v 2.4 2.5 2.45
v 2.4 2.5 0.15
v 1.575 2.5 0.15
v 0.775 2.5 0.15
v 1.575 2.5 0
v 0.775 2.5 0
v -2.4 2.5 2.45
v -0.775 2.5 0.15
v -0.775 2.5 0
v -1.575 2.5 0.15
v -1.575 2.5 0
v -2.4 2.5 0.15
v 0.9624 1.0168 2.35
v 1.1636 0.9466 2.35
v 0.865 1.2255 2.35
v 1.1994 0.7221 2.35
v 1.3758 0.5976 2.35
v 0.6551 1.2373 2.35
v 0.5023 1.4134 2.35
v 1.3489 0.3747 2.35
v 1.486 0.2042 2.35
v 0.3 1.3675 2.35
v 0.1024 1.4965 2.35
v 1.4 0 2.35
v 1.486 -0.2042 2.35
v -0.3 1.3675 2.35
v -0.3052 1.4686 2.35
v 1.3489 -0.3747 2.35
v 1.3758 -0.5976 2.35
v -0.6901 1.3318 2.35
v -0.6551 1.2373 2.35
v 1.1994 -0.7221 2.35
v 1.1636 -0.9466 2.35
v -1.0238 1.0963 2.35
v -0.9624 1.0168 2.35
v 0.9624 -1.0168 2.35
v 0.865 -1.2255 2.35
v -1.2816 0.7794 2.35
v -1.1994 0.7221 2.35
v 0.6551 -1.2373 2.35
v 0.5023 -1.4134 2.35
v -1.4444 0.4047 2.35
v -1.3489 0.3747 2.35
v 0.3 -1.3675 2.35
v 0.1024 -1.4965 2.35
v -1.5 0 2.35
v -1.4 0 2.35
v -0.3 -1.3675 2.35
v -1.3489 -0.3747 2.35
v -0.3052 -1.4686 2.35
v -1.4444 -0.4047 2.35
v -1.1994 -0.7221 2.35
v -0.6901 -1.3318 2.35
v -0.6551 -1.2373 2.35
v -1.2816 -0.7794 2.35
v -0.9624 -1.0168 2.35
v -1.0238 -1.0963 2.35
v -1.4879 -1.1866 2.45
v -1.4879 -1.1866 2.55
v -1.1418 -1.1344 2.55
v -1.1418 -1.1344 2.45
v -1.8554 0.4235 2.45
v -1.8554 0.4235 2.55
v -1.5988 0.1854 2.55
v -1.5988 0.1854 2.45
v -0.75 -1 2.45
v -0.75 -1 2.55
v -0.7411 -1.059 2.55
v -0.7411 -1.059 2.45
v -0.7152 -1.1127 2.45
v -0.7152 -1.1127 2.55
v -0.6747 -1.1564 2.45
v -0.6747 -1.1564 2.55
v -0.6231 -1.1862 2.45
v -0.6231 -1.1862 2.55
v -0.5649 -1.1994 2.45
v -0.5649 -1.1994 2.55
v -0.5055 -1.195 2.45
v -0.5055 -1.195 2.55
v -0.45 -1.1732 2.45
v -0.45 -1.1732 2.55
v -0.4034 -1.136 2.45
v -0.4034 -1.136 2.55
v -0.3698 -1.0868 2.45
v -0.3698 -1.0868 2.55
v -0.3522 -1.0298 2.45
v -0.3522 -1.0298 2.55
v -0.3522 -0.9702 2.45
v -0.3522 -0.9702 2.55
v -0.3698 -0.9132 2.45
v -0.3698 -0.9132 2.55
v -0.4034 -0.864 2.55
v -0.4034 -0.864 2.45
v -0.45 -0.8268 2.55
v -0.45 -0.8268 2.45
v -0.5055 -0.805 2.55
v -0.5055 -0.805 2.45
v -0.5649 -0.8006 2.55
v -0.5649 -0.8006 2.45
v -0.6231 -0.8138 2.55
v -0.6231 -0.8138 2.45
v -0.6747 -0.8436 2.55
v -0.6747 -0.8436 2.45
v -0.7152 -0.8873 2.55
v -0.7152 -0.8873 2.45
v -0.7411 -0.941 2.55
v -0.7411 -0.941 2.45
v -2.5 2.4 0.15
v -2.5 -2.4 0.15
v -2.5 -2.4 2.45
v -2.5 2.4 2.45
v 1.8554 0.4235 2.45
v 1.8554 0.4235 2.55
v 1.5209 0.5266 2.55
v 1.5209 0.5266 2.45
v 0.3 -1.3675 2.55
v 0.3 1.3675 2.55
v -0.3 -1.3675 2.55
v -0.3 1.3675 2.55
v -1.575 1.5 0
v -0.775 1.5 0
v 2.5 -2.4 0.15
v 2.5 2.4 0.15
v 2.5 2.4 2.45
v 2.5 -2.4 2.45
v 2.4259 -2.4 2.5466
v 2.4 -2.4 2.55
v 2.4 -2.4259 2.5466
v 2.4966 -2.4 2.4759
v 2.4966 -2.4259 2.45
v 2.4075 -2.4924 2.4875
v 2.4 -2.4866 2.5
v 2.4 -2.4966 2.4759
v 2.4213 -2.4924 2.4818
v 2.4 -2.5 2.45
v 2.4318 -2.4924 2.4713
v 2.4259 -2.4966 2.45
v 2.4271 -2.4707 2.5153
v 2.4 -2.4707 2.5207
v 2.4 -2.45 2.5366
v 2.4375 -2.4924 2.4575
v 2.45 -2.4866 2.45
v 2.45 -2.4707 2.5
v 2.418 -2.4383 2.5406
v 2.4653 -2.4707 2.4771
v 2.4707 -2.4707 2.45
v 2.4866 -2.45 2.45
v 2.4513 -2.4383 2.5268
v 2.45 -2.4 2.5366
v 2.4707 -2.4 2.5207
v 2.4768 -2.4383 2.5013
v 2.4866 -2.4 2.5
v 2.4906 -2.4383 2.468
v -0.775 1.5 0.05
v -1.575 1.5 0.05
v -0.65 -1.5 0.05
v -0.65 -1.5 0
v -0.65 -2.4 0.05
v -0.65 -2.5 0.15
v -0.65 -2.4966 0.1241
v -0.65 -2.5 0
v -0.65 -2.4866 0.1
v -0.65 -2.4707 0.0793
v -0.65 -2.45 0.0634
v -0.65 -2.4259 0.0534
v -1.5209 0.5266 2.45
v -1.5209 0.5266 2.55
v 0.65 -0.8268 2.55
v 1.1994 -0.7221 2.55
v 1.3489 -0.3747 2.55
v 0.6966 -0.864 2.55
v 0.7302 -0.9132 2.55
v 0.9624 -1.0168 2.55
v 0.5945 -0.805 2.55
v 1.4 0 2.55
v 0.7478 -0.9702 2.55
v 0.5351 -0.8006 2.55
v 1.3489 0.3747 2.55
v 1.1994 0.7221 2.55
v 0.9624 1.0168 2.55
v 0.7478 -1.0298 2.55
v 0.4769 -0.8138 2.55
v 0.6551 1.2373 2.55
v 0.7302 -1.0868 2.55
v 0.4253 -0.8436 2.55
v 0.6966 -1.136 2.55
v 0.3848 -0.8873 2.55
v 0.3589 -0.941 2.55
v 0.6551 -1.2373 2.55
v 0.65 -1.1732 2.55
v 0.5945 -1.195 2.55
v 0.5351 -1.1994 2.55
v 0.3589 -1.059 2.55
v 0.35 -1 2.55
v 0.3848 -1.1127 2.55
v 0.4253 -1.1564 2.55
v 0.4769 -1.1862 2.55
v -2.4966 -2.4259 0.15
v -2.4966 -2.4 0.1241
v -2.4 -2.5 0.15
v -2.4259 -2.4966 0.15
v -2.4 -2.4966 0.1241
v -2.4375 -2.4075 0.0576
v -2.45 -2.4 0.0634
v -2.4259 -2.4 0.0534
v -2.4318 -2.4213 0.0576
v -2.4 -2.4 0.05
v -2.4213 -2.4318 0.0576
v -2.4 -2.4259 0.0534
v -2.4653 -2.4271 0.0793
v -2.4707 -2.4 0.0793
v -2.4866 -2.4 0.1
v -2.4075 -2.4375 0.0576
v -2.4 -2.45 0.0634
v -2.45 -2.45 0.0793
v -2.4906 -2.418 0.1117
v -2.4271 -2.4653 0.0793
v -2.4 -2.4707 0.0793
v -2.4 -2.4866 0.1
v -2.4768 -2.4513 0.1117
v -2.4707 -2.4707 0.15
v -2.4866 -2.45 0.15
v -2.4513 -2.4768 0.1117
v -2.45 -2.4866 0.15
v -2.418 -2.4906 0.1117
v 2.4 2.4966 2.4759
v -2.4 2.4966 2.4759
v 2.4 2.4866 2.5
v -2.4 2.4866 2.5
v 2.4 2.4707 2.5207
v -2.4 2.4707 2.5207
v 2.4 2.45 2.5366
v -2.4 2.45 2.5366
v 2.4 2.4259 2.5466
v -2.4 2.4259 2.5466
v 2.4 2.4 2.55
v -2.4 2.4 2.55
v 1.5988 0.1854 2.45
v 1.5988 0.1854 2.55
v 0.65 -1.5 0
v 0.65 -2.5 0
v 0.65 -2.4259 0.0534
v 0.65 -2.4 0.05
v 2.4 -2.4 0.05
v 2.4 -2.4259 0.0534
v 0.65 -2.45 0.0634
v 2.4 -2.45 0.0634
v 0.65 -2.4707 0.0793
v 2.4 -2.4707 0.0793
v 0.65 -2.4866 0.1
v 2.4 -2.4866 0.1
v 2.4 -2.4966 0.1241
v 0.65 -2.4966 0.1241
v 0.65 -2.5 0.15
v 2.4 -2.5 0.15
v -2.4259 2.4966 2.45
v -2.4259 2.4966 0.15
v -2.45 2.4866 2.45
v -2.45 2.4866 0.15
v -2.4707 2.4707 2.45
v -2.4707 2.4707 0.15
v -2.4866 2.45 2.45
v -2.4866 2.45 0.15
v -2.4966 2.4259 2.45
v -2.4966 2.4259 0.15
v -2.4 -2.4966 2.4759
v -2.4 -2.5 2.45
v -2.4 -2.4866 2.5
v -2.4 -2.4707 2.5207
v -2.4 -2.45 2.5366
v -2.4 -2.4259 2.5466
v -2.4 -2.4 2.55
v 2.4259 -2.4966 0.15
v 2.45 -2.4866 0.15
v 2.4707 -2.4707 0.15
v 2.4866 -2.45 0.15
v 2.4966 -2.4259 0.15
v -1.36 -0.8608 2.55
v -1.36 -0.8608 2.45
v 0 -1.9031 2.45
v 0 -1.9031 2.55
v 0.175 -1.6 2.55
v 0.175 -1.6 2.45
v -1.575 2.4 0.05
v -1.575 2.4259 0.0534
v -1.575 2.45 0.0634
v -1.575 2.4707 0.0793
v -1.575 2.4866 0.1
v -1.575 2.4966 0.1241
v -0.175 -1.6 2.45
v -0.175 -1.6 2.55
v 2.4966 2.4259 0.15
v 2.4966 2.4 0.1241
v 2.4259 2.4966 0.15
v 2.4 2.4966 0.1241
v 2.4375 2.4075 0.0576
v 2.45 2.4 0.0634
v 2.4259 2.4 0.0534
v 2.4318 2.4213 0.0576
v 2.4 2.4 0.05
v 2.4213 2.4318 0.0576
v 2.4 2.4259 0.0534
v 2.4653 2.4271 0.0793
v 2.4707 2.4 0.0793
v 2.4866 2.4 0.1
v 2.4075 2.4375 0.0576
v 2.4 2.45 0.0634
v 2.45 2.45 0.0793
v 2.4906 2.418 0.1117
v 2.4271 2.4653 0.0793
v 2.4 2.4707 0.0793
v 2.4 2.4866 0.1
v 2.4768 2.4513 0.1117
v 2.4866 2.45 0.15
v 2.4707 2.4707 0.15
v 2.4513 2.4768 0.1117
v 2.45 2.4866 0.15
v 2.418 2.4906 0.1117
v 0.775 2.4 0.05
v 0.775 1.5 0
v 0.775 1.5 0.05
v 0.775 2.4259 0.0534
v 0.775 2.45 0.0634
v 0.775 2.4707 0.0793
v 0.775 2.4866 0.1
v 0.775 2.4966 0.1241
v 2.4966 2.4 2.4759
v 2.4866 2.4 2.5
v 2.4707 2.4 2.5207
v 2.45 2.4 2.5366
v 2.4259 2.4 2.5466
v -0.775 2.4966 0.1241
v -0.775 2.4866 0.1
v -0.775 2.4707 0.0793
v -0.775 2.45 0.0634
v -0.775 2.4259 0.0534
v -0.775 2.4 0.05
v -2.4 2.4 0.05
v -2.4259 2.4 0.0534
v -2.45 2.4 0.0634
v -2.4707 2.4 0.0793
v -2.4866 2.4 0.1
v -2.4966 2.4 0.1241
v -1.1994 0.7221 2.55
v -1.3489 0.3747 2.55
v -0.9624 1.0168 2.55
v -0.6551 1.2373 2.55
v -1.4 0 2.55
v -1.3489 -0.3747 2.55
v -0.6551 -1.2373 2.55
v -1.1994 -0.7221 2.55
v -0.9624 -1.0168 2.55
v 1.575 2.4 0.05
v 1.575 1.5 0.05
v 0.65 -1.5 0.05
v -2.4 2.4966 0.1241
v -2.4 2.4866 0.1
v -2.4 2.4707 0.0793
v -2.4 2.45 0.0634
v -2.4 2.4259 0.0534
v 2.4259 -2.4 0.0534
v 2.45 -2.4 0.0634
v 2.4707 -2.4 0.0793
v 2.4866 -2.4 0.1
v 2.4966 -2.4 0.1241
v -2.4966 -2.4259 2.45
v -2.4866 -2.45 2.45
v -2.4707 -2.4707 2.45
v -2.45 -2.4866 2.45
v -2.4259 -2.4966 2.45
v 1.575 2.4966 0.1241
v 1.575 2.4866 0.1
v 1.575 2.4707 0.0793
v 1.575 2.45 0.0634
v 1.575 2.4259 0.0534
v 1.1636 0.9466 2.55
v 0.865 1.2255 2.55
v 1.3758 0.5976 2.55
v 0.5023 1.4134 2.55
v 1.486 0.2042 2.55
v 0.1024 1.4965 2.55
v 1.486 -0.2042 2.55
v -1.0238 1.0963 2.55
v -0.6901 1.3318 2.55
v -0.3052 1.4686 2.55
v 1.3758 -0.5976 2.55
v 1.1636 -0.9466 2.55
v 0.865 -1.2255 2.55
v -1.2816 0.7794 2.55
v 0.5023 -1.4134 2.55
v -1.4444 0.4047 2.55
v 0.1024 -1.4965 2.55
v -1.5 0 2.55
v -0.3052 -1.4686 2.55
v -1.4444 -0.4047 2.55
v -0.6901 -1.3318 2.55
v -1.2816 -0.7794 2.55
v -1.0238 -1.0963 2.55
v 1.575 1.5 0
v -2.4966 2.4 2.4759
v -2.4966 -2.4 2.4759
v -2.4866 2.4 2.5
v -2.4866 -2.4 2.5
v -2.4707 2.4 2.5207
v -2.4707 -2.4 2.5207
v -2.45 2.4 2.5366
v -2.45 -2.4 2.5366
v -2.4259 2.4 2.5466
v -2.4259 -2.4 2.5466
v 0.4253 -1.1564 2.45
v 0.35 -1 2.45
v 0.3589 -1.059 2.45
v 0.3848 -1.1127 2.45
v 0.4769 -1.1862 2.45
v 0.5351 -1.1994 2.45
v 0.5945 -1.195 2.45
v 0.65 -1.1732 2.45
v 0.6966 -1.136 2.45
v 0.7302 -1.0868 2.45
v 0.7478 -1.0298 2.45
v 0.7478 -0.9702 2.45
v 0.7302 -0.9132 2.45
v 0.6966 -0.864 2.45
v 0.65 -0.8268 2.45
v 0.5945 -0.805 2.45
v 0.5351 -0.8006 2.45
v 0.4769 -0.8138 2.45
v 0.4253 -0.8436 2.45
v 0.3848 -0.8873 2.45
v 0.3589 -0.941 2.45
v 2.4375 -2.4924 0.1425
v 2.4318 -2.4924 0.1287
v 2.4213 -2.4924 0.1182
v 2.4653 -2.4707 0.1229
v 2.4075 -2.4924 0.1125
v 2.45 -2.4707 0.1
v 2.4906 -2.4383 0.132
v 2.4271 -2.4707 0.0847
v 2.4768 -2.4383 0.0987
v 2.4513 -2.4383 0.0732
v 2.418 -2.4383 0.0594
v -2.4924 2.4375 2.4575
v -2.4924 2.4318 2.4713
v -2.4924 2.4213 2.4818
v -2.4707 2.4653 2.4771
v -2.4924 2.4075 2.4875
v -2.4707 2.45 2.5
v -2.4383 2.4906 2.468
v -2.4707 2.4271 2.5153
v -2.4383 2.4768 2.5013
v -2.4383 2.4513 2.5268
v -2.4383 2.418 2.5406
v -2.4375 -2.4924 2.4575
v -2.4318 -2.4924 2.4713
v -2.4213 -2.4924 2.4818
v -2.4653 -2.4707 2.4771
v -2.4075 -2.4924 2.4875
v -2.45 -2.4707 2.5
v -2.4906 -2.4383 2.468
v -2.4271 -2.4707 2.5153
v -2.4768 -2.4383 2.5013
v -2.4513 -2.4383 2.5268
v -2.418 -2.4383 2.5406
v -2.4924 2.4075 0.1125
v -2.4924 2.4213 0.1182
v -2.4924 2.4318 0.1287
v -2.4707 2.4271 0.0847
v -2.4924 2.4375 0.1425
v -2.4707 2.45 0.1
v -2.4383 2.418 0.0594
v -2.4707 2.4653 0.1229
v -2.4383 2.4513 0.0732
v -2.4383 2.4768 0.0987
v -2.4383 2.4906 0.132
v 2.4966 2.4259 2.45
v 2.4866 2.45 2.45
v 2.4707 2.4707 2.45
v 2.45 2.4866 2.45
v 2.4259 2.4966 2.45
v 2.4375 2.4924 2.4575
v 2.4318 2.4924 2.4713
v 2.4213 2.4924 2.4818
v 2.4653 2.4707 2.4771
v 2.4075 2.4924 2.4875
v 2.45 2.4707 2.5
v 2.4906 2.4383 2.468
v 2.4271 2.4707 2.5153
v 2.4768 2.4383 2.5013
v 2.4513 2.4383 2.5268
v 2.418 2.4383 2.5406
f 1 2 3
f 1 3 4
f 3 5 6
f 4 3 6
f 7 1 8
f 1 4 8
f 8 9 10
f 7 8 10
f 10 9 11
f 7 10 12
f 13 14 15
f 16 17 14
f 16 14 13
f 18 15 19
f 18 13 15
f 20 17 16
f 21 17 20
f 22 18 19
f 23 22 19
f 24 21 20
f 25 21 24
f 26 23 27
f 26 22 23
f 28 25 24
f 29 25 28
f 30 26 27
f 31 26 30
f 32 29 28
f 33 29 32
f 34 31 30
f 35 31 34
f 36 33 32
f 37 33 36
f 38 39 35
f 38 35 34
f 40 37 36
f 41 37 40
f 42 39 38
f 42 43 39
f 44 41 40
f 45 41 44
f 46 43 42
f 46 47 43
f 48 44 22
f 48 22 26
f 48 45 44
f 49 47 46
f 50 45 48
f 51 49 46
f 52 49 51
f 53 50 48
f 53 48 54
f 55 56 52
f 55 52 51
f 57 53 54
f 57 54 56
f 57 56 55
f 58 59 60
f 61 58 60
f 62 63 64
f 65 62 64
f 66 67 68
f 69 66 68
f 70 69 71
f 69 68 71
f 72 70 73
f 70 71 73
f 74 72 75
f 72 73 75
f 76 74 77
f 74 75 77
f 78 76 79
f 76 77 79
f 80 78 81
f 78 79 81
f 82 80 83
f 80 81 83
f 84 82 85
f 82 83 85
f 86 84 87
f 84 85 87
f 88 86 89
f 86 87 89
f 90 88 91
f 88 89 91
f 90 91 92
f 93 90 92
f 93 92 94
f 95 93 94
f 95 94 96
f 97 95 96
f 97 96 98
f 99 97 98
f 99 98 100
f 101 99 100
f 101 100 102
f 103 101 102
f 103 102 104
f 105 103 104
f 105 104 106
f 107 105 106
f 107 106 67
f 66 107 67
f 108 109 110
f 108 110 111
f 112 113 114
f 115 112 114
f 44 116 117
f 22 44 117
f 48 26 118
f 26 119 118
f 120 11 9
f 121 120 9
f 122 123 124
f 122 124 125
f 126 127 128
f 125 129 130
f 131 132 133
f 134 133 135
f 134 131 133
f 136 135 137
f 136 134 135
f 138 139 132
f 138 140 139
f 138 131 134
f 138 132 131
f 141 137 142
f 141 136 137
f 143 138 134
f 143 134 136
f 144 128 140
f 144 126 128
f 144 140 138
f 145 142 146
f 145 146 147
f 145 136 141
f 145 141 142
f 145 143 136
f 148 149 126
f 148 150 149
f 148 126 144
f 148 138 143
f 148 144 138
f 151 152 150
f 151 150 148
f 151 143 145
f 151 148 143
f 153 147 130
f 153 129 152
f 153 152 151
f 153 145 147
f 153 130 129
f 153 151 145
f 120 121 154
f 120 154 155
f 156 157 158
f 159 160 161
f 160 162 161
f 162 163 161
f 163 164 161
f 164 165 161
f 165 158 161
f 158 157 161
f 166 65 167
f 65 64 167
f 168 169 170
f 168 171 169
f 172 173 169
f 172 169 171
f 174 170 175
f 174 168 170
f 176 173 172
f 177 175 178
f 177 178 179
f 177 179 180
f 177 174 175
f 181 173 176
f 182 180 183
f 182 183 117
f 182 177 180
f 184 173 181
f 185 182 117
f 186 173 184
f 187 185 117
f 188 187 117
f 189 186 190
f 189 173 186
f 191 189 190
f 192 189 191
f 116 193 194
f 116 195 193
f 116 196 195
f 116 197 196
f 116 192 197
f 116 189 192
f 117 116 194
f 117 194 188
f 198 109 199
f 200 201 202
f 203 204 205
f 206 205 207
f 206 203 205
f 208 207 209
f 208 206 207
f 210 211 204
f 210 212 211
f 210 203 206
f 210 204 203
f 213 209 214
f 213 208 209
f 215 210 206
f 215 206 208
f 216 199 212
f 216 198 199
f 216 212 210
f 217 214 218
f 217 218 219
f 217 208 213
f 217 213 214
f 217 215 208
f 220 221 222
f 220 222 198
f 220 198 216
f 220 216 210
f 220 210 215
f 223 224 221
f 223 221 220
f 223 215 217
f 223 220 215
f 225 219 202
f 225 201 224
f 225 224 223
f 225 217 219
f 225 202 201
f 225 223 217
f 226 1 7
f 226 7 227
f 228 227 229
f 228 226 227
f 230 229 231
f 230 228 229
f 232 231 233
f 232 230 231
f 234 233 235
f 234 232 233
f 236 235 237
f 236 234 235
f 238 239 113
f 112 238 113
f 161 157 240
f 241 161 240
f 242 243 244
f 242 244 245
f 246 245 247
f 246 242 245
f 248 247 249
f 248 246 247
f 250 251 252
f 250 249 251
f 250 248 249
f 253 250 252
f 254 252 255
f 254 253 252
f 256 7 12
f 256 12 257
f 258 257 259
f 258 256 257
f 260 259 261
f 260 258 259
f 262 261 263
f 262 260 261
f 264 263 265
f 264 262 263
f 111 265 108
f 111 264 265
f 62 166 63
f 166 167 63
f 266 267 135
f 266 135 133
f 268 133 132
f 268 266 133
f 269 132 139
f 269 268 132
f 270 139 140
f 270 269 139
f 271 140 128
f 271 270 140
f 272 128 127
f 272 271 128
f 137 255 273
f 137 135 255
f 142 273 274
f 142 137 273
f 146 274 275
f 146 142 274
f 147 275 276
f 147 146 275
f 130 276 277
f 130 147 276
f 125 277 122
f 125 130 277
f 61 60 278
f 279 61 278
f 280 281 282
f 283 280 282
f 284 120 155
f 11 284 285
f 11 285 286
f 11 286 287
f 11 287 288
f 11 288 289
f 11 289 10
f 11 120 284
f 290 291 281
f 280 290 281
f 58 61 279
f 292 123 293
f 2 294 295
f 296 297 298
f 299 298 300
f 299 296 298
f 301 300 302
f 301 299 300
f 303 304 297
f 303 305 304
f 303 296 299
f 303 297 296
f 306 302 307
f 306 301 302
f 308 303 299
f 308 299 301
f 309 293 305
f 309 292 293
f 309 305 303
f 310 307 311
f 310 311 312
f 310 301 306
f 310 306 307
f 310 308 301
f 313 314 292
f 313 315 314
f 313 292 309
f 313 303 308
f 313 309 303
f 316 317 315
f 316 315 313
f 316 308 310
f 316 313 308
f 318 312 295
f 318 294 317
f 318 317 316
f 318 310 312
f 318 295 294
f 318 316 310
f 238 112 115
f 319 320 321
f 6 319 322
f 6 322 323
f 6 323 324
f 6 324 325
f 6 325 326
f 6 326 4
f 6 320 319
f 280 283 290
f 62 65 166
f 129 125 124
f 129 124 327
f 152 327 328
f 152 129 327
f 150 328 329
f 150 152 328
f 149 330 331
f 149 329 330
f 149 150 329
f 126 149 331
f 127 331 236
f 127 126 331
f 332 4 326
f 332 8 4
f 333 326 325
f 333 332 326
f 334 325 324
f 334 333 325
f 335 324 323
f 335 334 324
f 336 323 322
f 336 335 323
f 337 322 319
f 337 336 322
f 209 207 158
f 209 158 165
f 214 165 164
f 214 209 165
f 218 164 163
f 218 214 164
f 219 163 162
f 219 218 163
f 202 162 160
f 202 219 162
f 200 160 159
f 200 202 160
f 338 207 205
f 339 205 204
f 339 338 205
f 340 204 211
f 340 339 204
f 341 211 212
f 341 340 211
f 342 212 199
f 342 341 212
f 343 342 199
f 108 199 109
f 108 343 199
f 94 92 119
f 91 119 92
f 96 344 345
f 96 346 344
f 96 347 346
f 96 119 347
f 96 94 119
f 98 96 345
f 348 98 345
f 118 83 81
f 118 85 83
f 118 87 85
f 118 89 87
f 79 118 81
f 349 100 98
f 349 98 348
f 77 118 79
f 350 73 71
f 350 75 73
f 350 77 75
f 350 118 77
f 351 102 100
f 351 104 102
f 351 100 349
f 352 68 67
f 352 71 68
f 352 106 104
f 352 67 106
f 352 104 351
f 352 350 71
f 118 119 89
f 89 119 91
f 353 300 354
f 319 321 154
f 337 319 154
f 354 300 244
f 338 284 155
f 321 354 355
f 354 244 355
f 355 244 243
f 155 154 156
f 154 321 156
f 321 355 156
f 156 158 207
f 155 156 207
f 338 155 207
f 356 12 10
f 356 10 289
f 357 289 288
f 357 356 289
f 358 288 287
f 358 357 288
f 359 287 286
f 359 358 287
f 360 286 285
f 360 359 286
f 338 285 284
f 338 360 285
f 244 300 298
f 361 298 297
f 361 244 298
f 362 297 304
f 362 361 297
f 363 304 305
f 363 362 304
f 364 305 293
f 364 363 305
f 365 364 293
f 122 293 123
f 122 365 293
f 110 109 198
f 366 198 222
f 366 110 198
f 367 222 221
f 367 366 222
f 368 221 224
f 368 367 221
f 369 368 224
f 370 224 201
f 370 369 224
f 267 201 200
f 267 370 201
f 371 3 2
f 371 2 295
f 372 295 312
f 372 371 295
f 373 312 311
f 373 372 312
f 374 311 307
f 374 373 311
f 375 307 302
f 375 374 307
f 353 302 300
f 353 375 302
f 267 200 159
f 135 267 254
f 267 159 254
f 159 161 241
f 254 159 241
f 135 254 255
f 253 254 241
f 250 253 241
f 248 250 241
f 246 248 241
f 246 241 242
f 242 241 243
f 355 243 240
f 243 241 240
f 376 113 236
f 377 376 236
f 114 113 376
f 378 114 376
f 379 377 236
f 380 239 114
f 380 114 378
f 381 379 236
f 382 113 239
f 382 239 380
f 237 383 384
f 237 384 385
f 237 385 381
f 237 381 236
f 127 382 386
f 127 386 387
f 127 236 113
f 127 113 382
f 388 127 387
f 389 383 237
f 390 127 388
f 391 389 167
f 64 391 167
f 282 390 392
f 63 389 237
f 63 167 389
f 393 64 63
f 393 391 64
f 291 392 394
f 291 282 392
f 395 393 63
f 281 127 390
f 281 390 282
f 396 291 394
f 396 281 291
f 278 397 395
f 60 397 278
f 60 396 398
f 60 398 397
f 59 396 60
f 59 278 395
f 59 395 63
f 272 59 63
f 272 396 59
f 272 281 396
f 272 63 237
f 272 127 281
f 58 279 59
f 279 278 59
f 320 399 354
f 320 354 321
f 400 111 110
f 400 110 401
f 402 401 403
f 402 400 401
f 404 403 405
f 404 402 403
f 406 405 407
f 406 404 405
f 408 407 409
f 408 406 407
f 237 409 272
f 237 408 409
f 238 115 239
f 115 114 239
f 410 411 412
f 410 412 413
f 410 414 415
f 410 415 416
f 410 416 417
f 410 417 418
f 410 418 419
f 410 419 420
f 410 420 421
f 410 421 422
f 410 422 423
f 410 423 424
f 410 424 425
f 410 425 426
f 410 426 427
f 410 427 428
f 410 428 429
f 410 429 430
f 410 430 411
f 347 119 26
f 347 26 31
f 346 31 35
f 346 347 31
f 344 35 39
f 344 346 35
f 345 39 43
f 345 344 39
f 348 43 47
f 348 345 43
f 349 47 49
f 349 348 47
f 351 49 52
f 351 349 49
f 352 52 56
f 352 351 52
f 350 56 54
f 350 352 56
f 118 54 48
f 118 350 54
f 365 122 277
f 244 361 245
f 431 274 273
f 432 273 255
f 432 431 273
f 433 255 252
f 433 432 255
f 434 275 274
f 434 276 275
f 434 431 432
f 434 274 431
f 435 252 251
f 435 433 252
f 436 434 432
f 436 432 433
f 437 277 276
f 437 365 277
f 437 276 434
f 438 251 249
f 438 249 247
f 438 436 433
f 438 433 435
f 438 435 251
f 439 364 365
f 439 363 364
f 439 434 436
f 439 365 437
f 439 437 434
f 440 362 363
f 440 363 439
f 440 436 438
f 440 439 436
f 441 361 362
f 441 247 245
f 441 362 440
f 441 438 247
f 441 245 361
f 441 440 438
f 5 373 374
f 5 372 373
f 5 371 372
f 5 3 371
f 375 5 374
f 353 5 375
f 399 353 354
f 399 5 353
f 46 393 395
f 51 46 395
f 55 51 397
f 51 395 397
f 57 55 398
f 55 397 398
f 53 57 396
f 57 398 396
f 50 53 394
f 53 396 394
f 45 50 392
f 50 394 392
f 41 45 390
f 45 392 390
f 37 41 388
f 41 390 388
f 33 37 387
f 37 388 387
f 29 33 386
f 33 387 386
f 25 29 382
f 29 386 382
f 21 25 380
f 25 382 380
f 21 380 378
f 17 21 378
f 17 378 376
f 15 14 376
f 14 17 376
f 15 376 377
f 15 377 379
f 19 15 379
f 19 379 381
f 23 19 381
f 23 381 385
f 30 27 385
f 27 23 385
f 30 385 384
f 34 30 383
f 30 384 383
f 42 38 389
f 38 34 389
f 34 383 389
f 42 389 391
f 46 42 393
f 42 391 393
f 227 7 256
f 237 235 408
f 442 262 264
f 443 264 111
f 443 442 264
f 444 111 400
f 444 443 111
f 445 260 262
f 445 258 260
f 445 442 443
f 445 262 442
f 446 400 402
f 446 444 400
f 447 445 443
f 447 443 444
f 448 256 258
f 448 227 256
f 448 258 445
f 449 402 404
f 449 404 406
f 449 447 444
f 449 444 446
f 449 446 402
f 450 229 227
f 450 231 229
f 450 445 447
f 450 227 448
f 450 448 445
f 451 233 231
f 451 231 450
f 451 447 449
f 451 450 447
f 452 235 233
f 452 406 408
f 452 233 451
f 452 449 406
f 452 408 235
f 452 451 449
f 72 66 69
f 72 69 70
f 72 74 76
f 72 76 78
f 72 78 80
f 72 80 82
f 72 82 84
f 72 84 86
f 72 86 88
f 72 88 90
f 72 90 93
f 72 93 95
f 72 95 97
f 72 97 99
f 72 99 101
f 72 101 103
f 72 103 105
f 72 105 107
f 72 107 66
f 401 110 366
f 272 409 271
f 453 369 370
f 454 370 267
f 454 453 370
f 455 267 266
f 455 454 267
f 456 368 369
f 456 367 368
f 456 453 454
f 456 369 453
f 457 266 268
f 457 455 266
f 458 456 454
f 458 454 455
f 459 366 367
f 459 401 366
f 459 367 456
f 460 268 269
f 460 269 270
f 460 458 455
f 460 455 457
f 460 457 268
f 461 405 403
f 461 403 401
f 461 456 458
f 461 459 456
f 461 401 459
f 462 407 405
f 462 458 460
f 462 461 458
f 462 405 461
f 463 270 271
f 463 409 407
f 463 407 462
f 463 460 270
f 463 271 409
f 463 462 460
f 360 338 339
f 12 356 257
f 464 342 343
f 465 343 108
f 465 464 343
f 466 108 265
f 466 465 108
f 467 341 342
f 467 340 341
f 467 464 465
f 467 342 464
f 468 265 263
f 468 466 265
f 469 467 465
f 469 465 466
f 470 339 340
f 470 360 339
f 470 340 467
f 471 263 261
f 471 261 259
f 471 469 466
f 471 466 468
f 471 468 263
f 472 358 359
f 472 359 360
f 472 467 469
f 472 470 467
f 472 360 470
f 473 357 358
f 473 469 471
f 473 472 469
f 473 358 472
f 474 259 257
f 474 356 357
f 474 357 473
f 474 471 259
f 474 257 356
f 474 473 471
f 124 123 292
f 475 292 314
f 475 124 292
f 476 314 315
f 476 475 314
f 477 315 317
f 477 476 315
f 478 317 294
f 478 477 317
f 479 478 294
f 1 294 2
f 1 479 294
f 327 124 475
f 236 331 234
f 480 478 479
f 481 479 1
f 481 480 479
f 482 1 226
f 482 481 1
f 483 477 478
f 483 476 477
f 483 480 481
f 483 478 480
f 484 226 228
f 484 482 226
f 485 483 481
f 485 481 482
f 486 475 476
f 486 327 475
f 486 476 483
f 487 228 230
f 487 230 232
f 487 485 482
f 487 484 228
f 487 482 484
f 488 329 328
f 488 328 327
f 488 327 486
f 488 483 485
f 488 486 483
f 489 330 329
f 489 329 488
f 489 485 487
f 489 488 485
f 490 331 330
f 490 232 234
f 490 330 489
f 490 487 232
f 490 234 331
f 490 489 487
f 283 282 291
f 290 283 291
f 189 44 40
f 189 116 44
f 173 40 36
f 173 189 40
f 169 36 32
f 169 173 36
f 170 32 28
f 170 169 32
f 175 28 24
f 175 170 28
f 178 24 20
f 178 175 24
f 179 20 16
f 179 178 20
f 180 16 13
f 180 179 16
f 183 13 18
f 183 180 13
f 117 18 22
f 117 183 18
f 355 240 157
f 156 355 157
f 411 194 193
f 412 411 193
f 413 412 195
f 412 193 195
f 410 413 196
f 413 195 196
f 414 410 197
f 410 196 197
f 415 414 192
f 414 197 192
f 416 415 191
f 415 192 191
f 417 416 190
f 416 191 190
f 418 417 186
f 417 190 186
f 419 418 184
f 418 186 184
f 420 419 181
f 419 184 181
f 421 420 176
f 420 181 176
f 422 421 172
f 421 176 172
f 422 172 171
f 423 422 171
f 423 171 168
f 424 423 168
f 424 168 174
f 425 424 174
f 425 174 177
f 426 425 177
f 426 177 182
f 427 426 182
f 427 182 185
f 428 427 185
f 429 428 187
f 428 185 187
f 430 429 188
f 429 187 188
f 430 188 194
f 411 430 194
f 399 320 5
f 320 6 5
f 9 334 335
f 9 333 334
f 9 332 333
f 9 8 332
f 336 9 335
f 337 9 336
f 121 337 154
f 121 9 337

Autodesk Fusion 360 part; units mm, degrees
sketch "Sketch1" plane through (0, 0, 0) normal (0, 0, 1) x (1, 0, 0)
  line L0 (-1.575, 2.5) -> (-0.775, 2.5)
  line L1 (-0.775, 2.5) -> (-0.775, 1.5)
  line L2 (-0.775, 1.5) -> (-1.575, 1.5)
  line L3 (-1.575, 1.5) -> (-1.575, 2.5)
  line L4 (0, -1.5) -> (-0.65, -1.5)
  line L5 (-0.65, -1.5) -> (-0.65, -2.5)
  line L6 (-0.65, -2.5) -> (0, -2.5)
  line L7 (0, -2.5) -> (0, -1.5)
  dimension "d1" = 0.65
  dimension "d2" = 0.8
  dimension "d3" = 1
  dimension "d4" = 1
  dimension "d5" = 0.775
  dimension "d6" = 2.5
  dimension "d7" = 2.5
  dimension "d8" = 0.65
extrude "Extrude1" add sketch "Sketch1" along normal blind 0.05 makes body 1 at (-1.3083, 2.1667, 0) makes body 2 at (-0.4333, -1.8333, 0)
mirror "Mirror1" about plane through (0, 0, 0) normal (1, 0, 0) of bodies 1 2 makes body 3 at (1.3083, 2.1667, 0)
sketch "Sketch2" plane through (0, 0, 0.05) normal (0, 0, 1) x (-1, 0, 0)
  line L0 (1.575, -1.5) -> (0.775, -1.5)
  line L1 (0.775, -1.5) -> (0.775, -2.5)
  line L2 (0.775, -2.5) -> (1.575, -2.5)
  line L3 (1.575, -2.5) -> (1.575, -1.5)
  line L4 (2.5, -2.5) -> (-2.5, -2.5)
  line L5 (-2.5, -2.5) -> (-2.5, 2.5)
  line L6 (-2.5, 2.5) -> (2.5, 2.5)
  line L7 (2.5, 2.5) -> (2.5, -2.5)
  dimension "d13" = 2.5
  dimension "d14" = 2.5
  dimension "d15" = 5
  dimension "d16" = 5
extrude "Extrude2" add sketch "Sketch2" along normal blind 2.5 bodies 1 2 3
sketch "Sketch3" plane through (0, 0, 2.55) normal (0, 0, 1) x (-1, 0, 0)
  line L0 (2.5, 2.5) -> (-2.5, 2.5)
  line L1 (-2.5, 2.5) -> (-2.5, -2.5)
  line L2 (-2.5, -2.5) -> (2.5, -2.5)
  line L3 (2.5, -2.5) -> (2.5, 2.5)
  circle A0 centre (0, 0) radius 1.5
  circle A1 centre (0, 0) radius 1.4
  line L4 (0.3, -1.4697) -> (0.3, 1.4697)
  line L5 (-0.3, 1.4697) -> (-0.3, -1.4697)
  dimension "d19" = 3
  dimension "d20" = -0.1
  dimension "d21" = 0.3
  dimension "d22" = 0.3
extrude "Extrude3" cut sketch "Sketch3" against normal blind 0.2 contours A0 A1 L4 | A0 A1 L4 L5 | A0 A1 L4 L5 | A0 A1 L5 | A1 L4 L5 bodies 1
sketch "Sketch4" plane through (0, 0, 2.55) normal (0, 0, 1) x (-1, 0, 0)
  line L0 (0.3, 1.3675) -> (0.3, -1.3675)
  arc A0 (0.3, -1.3675) -> (0.3, 1.3675) centre (0, 0) ccw
  circle A1 centre (0.55, 1) radius 0.2
  circle A2 centre (-0.55, 1) radius 0.2
  line L1 (0.175, 1.6) -> (0, 1.9031)
  line L2 (0, 1.9031) -> (-0.175, 1.6)
  line L3 (-0.175, 1.6) -> (0.175, 1.6)
  line L4 (0, 0) -> (0, 2.2) construction
  line L5 (-1.8554, -0.4235) -> (-1.5209, -0.5266)
  line L6 (-1.5209, -0.5266) -> (-1.5988, -0.1854)
  line L7 (-1.5988, -0.1854) -> (-1.8554, -0.4235)
  line L8 (1.8554, -0.4235) -> (1.5988, -0.1854)
  line L9 (1.5988, -0.1854) -> (1.5209, -0.5266)
  line L10 (1.5209, -0.5266) -> (1.8554, -0.4235)
  line L11 (1.4879, 1.1866) -> (1.1418, 1.1344)
  line L12 (1.1418, 1.1344) -> (1.36, 0.8608)
  line L13 (1.36, 0.8608) -> (1.4879, 1.1866)
  dimension "d25" = 0.55
  dimension "d26" = 0.55
  dimension "d27" = 0.4
  dimension "d28" = 0.4
  dimension "d29" = 1
  dimension "d30" = 1
  dimension "d33" = 1.6
  dimension "d34" = 0.35
  dimension "d36" = 360
extrude "Extrude4" cut sketch "Sketch4" against normal blind 0.1 contours A1 | A2 bodies 1
extrude "Extrude6" cut sketch "Sketch4" against normal blind 0.1 contours L1 L2 L3 | L5 L6 L7 | L8 L9 L10 | L11 L12 L13 bodies 1
fillet "Fillet1" radius 0.1 15 edges at (2.5, 0, 2.55) (0, 2.5, 2.55) (2.5, 2.5, 1.3) (2.5, 0, 0.05) (2.0375, 2.5, 0.05) (0, 2.5, 0.05) (-2.0375, 2.5, 0.05) (-2.5, 2.5, 1.3) (-2.5, 0, 2.55) (0, -2.5, 2.55) (2.5, -2.5, 1.3) (-2.5, -2.5, 1.3) (-1.575, -2.5, 0.05) (1.575, -2.5, 0.05) (-2.5, 0, 0.05) on bodies 1
extrude "Extrude5" [suppressed]
equation "d1 = ( 1.3 / 2 ) * 1 mm"
equation "d5 = ( 2.35 / 2 ) * 1 mm - 0.4 mm"
